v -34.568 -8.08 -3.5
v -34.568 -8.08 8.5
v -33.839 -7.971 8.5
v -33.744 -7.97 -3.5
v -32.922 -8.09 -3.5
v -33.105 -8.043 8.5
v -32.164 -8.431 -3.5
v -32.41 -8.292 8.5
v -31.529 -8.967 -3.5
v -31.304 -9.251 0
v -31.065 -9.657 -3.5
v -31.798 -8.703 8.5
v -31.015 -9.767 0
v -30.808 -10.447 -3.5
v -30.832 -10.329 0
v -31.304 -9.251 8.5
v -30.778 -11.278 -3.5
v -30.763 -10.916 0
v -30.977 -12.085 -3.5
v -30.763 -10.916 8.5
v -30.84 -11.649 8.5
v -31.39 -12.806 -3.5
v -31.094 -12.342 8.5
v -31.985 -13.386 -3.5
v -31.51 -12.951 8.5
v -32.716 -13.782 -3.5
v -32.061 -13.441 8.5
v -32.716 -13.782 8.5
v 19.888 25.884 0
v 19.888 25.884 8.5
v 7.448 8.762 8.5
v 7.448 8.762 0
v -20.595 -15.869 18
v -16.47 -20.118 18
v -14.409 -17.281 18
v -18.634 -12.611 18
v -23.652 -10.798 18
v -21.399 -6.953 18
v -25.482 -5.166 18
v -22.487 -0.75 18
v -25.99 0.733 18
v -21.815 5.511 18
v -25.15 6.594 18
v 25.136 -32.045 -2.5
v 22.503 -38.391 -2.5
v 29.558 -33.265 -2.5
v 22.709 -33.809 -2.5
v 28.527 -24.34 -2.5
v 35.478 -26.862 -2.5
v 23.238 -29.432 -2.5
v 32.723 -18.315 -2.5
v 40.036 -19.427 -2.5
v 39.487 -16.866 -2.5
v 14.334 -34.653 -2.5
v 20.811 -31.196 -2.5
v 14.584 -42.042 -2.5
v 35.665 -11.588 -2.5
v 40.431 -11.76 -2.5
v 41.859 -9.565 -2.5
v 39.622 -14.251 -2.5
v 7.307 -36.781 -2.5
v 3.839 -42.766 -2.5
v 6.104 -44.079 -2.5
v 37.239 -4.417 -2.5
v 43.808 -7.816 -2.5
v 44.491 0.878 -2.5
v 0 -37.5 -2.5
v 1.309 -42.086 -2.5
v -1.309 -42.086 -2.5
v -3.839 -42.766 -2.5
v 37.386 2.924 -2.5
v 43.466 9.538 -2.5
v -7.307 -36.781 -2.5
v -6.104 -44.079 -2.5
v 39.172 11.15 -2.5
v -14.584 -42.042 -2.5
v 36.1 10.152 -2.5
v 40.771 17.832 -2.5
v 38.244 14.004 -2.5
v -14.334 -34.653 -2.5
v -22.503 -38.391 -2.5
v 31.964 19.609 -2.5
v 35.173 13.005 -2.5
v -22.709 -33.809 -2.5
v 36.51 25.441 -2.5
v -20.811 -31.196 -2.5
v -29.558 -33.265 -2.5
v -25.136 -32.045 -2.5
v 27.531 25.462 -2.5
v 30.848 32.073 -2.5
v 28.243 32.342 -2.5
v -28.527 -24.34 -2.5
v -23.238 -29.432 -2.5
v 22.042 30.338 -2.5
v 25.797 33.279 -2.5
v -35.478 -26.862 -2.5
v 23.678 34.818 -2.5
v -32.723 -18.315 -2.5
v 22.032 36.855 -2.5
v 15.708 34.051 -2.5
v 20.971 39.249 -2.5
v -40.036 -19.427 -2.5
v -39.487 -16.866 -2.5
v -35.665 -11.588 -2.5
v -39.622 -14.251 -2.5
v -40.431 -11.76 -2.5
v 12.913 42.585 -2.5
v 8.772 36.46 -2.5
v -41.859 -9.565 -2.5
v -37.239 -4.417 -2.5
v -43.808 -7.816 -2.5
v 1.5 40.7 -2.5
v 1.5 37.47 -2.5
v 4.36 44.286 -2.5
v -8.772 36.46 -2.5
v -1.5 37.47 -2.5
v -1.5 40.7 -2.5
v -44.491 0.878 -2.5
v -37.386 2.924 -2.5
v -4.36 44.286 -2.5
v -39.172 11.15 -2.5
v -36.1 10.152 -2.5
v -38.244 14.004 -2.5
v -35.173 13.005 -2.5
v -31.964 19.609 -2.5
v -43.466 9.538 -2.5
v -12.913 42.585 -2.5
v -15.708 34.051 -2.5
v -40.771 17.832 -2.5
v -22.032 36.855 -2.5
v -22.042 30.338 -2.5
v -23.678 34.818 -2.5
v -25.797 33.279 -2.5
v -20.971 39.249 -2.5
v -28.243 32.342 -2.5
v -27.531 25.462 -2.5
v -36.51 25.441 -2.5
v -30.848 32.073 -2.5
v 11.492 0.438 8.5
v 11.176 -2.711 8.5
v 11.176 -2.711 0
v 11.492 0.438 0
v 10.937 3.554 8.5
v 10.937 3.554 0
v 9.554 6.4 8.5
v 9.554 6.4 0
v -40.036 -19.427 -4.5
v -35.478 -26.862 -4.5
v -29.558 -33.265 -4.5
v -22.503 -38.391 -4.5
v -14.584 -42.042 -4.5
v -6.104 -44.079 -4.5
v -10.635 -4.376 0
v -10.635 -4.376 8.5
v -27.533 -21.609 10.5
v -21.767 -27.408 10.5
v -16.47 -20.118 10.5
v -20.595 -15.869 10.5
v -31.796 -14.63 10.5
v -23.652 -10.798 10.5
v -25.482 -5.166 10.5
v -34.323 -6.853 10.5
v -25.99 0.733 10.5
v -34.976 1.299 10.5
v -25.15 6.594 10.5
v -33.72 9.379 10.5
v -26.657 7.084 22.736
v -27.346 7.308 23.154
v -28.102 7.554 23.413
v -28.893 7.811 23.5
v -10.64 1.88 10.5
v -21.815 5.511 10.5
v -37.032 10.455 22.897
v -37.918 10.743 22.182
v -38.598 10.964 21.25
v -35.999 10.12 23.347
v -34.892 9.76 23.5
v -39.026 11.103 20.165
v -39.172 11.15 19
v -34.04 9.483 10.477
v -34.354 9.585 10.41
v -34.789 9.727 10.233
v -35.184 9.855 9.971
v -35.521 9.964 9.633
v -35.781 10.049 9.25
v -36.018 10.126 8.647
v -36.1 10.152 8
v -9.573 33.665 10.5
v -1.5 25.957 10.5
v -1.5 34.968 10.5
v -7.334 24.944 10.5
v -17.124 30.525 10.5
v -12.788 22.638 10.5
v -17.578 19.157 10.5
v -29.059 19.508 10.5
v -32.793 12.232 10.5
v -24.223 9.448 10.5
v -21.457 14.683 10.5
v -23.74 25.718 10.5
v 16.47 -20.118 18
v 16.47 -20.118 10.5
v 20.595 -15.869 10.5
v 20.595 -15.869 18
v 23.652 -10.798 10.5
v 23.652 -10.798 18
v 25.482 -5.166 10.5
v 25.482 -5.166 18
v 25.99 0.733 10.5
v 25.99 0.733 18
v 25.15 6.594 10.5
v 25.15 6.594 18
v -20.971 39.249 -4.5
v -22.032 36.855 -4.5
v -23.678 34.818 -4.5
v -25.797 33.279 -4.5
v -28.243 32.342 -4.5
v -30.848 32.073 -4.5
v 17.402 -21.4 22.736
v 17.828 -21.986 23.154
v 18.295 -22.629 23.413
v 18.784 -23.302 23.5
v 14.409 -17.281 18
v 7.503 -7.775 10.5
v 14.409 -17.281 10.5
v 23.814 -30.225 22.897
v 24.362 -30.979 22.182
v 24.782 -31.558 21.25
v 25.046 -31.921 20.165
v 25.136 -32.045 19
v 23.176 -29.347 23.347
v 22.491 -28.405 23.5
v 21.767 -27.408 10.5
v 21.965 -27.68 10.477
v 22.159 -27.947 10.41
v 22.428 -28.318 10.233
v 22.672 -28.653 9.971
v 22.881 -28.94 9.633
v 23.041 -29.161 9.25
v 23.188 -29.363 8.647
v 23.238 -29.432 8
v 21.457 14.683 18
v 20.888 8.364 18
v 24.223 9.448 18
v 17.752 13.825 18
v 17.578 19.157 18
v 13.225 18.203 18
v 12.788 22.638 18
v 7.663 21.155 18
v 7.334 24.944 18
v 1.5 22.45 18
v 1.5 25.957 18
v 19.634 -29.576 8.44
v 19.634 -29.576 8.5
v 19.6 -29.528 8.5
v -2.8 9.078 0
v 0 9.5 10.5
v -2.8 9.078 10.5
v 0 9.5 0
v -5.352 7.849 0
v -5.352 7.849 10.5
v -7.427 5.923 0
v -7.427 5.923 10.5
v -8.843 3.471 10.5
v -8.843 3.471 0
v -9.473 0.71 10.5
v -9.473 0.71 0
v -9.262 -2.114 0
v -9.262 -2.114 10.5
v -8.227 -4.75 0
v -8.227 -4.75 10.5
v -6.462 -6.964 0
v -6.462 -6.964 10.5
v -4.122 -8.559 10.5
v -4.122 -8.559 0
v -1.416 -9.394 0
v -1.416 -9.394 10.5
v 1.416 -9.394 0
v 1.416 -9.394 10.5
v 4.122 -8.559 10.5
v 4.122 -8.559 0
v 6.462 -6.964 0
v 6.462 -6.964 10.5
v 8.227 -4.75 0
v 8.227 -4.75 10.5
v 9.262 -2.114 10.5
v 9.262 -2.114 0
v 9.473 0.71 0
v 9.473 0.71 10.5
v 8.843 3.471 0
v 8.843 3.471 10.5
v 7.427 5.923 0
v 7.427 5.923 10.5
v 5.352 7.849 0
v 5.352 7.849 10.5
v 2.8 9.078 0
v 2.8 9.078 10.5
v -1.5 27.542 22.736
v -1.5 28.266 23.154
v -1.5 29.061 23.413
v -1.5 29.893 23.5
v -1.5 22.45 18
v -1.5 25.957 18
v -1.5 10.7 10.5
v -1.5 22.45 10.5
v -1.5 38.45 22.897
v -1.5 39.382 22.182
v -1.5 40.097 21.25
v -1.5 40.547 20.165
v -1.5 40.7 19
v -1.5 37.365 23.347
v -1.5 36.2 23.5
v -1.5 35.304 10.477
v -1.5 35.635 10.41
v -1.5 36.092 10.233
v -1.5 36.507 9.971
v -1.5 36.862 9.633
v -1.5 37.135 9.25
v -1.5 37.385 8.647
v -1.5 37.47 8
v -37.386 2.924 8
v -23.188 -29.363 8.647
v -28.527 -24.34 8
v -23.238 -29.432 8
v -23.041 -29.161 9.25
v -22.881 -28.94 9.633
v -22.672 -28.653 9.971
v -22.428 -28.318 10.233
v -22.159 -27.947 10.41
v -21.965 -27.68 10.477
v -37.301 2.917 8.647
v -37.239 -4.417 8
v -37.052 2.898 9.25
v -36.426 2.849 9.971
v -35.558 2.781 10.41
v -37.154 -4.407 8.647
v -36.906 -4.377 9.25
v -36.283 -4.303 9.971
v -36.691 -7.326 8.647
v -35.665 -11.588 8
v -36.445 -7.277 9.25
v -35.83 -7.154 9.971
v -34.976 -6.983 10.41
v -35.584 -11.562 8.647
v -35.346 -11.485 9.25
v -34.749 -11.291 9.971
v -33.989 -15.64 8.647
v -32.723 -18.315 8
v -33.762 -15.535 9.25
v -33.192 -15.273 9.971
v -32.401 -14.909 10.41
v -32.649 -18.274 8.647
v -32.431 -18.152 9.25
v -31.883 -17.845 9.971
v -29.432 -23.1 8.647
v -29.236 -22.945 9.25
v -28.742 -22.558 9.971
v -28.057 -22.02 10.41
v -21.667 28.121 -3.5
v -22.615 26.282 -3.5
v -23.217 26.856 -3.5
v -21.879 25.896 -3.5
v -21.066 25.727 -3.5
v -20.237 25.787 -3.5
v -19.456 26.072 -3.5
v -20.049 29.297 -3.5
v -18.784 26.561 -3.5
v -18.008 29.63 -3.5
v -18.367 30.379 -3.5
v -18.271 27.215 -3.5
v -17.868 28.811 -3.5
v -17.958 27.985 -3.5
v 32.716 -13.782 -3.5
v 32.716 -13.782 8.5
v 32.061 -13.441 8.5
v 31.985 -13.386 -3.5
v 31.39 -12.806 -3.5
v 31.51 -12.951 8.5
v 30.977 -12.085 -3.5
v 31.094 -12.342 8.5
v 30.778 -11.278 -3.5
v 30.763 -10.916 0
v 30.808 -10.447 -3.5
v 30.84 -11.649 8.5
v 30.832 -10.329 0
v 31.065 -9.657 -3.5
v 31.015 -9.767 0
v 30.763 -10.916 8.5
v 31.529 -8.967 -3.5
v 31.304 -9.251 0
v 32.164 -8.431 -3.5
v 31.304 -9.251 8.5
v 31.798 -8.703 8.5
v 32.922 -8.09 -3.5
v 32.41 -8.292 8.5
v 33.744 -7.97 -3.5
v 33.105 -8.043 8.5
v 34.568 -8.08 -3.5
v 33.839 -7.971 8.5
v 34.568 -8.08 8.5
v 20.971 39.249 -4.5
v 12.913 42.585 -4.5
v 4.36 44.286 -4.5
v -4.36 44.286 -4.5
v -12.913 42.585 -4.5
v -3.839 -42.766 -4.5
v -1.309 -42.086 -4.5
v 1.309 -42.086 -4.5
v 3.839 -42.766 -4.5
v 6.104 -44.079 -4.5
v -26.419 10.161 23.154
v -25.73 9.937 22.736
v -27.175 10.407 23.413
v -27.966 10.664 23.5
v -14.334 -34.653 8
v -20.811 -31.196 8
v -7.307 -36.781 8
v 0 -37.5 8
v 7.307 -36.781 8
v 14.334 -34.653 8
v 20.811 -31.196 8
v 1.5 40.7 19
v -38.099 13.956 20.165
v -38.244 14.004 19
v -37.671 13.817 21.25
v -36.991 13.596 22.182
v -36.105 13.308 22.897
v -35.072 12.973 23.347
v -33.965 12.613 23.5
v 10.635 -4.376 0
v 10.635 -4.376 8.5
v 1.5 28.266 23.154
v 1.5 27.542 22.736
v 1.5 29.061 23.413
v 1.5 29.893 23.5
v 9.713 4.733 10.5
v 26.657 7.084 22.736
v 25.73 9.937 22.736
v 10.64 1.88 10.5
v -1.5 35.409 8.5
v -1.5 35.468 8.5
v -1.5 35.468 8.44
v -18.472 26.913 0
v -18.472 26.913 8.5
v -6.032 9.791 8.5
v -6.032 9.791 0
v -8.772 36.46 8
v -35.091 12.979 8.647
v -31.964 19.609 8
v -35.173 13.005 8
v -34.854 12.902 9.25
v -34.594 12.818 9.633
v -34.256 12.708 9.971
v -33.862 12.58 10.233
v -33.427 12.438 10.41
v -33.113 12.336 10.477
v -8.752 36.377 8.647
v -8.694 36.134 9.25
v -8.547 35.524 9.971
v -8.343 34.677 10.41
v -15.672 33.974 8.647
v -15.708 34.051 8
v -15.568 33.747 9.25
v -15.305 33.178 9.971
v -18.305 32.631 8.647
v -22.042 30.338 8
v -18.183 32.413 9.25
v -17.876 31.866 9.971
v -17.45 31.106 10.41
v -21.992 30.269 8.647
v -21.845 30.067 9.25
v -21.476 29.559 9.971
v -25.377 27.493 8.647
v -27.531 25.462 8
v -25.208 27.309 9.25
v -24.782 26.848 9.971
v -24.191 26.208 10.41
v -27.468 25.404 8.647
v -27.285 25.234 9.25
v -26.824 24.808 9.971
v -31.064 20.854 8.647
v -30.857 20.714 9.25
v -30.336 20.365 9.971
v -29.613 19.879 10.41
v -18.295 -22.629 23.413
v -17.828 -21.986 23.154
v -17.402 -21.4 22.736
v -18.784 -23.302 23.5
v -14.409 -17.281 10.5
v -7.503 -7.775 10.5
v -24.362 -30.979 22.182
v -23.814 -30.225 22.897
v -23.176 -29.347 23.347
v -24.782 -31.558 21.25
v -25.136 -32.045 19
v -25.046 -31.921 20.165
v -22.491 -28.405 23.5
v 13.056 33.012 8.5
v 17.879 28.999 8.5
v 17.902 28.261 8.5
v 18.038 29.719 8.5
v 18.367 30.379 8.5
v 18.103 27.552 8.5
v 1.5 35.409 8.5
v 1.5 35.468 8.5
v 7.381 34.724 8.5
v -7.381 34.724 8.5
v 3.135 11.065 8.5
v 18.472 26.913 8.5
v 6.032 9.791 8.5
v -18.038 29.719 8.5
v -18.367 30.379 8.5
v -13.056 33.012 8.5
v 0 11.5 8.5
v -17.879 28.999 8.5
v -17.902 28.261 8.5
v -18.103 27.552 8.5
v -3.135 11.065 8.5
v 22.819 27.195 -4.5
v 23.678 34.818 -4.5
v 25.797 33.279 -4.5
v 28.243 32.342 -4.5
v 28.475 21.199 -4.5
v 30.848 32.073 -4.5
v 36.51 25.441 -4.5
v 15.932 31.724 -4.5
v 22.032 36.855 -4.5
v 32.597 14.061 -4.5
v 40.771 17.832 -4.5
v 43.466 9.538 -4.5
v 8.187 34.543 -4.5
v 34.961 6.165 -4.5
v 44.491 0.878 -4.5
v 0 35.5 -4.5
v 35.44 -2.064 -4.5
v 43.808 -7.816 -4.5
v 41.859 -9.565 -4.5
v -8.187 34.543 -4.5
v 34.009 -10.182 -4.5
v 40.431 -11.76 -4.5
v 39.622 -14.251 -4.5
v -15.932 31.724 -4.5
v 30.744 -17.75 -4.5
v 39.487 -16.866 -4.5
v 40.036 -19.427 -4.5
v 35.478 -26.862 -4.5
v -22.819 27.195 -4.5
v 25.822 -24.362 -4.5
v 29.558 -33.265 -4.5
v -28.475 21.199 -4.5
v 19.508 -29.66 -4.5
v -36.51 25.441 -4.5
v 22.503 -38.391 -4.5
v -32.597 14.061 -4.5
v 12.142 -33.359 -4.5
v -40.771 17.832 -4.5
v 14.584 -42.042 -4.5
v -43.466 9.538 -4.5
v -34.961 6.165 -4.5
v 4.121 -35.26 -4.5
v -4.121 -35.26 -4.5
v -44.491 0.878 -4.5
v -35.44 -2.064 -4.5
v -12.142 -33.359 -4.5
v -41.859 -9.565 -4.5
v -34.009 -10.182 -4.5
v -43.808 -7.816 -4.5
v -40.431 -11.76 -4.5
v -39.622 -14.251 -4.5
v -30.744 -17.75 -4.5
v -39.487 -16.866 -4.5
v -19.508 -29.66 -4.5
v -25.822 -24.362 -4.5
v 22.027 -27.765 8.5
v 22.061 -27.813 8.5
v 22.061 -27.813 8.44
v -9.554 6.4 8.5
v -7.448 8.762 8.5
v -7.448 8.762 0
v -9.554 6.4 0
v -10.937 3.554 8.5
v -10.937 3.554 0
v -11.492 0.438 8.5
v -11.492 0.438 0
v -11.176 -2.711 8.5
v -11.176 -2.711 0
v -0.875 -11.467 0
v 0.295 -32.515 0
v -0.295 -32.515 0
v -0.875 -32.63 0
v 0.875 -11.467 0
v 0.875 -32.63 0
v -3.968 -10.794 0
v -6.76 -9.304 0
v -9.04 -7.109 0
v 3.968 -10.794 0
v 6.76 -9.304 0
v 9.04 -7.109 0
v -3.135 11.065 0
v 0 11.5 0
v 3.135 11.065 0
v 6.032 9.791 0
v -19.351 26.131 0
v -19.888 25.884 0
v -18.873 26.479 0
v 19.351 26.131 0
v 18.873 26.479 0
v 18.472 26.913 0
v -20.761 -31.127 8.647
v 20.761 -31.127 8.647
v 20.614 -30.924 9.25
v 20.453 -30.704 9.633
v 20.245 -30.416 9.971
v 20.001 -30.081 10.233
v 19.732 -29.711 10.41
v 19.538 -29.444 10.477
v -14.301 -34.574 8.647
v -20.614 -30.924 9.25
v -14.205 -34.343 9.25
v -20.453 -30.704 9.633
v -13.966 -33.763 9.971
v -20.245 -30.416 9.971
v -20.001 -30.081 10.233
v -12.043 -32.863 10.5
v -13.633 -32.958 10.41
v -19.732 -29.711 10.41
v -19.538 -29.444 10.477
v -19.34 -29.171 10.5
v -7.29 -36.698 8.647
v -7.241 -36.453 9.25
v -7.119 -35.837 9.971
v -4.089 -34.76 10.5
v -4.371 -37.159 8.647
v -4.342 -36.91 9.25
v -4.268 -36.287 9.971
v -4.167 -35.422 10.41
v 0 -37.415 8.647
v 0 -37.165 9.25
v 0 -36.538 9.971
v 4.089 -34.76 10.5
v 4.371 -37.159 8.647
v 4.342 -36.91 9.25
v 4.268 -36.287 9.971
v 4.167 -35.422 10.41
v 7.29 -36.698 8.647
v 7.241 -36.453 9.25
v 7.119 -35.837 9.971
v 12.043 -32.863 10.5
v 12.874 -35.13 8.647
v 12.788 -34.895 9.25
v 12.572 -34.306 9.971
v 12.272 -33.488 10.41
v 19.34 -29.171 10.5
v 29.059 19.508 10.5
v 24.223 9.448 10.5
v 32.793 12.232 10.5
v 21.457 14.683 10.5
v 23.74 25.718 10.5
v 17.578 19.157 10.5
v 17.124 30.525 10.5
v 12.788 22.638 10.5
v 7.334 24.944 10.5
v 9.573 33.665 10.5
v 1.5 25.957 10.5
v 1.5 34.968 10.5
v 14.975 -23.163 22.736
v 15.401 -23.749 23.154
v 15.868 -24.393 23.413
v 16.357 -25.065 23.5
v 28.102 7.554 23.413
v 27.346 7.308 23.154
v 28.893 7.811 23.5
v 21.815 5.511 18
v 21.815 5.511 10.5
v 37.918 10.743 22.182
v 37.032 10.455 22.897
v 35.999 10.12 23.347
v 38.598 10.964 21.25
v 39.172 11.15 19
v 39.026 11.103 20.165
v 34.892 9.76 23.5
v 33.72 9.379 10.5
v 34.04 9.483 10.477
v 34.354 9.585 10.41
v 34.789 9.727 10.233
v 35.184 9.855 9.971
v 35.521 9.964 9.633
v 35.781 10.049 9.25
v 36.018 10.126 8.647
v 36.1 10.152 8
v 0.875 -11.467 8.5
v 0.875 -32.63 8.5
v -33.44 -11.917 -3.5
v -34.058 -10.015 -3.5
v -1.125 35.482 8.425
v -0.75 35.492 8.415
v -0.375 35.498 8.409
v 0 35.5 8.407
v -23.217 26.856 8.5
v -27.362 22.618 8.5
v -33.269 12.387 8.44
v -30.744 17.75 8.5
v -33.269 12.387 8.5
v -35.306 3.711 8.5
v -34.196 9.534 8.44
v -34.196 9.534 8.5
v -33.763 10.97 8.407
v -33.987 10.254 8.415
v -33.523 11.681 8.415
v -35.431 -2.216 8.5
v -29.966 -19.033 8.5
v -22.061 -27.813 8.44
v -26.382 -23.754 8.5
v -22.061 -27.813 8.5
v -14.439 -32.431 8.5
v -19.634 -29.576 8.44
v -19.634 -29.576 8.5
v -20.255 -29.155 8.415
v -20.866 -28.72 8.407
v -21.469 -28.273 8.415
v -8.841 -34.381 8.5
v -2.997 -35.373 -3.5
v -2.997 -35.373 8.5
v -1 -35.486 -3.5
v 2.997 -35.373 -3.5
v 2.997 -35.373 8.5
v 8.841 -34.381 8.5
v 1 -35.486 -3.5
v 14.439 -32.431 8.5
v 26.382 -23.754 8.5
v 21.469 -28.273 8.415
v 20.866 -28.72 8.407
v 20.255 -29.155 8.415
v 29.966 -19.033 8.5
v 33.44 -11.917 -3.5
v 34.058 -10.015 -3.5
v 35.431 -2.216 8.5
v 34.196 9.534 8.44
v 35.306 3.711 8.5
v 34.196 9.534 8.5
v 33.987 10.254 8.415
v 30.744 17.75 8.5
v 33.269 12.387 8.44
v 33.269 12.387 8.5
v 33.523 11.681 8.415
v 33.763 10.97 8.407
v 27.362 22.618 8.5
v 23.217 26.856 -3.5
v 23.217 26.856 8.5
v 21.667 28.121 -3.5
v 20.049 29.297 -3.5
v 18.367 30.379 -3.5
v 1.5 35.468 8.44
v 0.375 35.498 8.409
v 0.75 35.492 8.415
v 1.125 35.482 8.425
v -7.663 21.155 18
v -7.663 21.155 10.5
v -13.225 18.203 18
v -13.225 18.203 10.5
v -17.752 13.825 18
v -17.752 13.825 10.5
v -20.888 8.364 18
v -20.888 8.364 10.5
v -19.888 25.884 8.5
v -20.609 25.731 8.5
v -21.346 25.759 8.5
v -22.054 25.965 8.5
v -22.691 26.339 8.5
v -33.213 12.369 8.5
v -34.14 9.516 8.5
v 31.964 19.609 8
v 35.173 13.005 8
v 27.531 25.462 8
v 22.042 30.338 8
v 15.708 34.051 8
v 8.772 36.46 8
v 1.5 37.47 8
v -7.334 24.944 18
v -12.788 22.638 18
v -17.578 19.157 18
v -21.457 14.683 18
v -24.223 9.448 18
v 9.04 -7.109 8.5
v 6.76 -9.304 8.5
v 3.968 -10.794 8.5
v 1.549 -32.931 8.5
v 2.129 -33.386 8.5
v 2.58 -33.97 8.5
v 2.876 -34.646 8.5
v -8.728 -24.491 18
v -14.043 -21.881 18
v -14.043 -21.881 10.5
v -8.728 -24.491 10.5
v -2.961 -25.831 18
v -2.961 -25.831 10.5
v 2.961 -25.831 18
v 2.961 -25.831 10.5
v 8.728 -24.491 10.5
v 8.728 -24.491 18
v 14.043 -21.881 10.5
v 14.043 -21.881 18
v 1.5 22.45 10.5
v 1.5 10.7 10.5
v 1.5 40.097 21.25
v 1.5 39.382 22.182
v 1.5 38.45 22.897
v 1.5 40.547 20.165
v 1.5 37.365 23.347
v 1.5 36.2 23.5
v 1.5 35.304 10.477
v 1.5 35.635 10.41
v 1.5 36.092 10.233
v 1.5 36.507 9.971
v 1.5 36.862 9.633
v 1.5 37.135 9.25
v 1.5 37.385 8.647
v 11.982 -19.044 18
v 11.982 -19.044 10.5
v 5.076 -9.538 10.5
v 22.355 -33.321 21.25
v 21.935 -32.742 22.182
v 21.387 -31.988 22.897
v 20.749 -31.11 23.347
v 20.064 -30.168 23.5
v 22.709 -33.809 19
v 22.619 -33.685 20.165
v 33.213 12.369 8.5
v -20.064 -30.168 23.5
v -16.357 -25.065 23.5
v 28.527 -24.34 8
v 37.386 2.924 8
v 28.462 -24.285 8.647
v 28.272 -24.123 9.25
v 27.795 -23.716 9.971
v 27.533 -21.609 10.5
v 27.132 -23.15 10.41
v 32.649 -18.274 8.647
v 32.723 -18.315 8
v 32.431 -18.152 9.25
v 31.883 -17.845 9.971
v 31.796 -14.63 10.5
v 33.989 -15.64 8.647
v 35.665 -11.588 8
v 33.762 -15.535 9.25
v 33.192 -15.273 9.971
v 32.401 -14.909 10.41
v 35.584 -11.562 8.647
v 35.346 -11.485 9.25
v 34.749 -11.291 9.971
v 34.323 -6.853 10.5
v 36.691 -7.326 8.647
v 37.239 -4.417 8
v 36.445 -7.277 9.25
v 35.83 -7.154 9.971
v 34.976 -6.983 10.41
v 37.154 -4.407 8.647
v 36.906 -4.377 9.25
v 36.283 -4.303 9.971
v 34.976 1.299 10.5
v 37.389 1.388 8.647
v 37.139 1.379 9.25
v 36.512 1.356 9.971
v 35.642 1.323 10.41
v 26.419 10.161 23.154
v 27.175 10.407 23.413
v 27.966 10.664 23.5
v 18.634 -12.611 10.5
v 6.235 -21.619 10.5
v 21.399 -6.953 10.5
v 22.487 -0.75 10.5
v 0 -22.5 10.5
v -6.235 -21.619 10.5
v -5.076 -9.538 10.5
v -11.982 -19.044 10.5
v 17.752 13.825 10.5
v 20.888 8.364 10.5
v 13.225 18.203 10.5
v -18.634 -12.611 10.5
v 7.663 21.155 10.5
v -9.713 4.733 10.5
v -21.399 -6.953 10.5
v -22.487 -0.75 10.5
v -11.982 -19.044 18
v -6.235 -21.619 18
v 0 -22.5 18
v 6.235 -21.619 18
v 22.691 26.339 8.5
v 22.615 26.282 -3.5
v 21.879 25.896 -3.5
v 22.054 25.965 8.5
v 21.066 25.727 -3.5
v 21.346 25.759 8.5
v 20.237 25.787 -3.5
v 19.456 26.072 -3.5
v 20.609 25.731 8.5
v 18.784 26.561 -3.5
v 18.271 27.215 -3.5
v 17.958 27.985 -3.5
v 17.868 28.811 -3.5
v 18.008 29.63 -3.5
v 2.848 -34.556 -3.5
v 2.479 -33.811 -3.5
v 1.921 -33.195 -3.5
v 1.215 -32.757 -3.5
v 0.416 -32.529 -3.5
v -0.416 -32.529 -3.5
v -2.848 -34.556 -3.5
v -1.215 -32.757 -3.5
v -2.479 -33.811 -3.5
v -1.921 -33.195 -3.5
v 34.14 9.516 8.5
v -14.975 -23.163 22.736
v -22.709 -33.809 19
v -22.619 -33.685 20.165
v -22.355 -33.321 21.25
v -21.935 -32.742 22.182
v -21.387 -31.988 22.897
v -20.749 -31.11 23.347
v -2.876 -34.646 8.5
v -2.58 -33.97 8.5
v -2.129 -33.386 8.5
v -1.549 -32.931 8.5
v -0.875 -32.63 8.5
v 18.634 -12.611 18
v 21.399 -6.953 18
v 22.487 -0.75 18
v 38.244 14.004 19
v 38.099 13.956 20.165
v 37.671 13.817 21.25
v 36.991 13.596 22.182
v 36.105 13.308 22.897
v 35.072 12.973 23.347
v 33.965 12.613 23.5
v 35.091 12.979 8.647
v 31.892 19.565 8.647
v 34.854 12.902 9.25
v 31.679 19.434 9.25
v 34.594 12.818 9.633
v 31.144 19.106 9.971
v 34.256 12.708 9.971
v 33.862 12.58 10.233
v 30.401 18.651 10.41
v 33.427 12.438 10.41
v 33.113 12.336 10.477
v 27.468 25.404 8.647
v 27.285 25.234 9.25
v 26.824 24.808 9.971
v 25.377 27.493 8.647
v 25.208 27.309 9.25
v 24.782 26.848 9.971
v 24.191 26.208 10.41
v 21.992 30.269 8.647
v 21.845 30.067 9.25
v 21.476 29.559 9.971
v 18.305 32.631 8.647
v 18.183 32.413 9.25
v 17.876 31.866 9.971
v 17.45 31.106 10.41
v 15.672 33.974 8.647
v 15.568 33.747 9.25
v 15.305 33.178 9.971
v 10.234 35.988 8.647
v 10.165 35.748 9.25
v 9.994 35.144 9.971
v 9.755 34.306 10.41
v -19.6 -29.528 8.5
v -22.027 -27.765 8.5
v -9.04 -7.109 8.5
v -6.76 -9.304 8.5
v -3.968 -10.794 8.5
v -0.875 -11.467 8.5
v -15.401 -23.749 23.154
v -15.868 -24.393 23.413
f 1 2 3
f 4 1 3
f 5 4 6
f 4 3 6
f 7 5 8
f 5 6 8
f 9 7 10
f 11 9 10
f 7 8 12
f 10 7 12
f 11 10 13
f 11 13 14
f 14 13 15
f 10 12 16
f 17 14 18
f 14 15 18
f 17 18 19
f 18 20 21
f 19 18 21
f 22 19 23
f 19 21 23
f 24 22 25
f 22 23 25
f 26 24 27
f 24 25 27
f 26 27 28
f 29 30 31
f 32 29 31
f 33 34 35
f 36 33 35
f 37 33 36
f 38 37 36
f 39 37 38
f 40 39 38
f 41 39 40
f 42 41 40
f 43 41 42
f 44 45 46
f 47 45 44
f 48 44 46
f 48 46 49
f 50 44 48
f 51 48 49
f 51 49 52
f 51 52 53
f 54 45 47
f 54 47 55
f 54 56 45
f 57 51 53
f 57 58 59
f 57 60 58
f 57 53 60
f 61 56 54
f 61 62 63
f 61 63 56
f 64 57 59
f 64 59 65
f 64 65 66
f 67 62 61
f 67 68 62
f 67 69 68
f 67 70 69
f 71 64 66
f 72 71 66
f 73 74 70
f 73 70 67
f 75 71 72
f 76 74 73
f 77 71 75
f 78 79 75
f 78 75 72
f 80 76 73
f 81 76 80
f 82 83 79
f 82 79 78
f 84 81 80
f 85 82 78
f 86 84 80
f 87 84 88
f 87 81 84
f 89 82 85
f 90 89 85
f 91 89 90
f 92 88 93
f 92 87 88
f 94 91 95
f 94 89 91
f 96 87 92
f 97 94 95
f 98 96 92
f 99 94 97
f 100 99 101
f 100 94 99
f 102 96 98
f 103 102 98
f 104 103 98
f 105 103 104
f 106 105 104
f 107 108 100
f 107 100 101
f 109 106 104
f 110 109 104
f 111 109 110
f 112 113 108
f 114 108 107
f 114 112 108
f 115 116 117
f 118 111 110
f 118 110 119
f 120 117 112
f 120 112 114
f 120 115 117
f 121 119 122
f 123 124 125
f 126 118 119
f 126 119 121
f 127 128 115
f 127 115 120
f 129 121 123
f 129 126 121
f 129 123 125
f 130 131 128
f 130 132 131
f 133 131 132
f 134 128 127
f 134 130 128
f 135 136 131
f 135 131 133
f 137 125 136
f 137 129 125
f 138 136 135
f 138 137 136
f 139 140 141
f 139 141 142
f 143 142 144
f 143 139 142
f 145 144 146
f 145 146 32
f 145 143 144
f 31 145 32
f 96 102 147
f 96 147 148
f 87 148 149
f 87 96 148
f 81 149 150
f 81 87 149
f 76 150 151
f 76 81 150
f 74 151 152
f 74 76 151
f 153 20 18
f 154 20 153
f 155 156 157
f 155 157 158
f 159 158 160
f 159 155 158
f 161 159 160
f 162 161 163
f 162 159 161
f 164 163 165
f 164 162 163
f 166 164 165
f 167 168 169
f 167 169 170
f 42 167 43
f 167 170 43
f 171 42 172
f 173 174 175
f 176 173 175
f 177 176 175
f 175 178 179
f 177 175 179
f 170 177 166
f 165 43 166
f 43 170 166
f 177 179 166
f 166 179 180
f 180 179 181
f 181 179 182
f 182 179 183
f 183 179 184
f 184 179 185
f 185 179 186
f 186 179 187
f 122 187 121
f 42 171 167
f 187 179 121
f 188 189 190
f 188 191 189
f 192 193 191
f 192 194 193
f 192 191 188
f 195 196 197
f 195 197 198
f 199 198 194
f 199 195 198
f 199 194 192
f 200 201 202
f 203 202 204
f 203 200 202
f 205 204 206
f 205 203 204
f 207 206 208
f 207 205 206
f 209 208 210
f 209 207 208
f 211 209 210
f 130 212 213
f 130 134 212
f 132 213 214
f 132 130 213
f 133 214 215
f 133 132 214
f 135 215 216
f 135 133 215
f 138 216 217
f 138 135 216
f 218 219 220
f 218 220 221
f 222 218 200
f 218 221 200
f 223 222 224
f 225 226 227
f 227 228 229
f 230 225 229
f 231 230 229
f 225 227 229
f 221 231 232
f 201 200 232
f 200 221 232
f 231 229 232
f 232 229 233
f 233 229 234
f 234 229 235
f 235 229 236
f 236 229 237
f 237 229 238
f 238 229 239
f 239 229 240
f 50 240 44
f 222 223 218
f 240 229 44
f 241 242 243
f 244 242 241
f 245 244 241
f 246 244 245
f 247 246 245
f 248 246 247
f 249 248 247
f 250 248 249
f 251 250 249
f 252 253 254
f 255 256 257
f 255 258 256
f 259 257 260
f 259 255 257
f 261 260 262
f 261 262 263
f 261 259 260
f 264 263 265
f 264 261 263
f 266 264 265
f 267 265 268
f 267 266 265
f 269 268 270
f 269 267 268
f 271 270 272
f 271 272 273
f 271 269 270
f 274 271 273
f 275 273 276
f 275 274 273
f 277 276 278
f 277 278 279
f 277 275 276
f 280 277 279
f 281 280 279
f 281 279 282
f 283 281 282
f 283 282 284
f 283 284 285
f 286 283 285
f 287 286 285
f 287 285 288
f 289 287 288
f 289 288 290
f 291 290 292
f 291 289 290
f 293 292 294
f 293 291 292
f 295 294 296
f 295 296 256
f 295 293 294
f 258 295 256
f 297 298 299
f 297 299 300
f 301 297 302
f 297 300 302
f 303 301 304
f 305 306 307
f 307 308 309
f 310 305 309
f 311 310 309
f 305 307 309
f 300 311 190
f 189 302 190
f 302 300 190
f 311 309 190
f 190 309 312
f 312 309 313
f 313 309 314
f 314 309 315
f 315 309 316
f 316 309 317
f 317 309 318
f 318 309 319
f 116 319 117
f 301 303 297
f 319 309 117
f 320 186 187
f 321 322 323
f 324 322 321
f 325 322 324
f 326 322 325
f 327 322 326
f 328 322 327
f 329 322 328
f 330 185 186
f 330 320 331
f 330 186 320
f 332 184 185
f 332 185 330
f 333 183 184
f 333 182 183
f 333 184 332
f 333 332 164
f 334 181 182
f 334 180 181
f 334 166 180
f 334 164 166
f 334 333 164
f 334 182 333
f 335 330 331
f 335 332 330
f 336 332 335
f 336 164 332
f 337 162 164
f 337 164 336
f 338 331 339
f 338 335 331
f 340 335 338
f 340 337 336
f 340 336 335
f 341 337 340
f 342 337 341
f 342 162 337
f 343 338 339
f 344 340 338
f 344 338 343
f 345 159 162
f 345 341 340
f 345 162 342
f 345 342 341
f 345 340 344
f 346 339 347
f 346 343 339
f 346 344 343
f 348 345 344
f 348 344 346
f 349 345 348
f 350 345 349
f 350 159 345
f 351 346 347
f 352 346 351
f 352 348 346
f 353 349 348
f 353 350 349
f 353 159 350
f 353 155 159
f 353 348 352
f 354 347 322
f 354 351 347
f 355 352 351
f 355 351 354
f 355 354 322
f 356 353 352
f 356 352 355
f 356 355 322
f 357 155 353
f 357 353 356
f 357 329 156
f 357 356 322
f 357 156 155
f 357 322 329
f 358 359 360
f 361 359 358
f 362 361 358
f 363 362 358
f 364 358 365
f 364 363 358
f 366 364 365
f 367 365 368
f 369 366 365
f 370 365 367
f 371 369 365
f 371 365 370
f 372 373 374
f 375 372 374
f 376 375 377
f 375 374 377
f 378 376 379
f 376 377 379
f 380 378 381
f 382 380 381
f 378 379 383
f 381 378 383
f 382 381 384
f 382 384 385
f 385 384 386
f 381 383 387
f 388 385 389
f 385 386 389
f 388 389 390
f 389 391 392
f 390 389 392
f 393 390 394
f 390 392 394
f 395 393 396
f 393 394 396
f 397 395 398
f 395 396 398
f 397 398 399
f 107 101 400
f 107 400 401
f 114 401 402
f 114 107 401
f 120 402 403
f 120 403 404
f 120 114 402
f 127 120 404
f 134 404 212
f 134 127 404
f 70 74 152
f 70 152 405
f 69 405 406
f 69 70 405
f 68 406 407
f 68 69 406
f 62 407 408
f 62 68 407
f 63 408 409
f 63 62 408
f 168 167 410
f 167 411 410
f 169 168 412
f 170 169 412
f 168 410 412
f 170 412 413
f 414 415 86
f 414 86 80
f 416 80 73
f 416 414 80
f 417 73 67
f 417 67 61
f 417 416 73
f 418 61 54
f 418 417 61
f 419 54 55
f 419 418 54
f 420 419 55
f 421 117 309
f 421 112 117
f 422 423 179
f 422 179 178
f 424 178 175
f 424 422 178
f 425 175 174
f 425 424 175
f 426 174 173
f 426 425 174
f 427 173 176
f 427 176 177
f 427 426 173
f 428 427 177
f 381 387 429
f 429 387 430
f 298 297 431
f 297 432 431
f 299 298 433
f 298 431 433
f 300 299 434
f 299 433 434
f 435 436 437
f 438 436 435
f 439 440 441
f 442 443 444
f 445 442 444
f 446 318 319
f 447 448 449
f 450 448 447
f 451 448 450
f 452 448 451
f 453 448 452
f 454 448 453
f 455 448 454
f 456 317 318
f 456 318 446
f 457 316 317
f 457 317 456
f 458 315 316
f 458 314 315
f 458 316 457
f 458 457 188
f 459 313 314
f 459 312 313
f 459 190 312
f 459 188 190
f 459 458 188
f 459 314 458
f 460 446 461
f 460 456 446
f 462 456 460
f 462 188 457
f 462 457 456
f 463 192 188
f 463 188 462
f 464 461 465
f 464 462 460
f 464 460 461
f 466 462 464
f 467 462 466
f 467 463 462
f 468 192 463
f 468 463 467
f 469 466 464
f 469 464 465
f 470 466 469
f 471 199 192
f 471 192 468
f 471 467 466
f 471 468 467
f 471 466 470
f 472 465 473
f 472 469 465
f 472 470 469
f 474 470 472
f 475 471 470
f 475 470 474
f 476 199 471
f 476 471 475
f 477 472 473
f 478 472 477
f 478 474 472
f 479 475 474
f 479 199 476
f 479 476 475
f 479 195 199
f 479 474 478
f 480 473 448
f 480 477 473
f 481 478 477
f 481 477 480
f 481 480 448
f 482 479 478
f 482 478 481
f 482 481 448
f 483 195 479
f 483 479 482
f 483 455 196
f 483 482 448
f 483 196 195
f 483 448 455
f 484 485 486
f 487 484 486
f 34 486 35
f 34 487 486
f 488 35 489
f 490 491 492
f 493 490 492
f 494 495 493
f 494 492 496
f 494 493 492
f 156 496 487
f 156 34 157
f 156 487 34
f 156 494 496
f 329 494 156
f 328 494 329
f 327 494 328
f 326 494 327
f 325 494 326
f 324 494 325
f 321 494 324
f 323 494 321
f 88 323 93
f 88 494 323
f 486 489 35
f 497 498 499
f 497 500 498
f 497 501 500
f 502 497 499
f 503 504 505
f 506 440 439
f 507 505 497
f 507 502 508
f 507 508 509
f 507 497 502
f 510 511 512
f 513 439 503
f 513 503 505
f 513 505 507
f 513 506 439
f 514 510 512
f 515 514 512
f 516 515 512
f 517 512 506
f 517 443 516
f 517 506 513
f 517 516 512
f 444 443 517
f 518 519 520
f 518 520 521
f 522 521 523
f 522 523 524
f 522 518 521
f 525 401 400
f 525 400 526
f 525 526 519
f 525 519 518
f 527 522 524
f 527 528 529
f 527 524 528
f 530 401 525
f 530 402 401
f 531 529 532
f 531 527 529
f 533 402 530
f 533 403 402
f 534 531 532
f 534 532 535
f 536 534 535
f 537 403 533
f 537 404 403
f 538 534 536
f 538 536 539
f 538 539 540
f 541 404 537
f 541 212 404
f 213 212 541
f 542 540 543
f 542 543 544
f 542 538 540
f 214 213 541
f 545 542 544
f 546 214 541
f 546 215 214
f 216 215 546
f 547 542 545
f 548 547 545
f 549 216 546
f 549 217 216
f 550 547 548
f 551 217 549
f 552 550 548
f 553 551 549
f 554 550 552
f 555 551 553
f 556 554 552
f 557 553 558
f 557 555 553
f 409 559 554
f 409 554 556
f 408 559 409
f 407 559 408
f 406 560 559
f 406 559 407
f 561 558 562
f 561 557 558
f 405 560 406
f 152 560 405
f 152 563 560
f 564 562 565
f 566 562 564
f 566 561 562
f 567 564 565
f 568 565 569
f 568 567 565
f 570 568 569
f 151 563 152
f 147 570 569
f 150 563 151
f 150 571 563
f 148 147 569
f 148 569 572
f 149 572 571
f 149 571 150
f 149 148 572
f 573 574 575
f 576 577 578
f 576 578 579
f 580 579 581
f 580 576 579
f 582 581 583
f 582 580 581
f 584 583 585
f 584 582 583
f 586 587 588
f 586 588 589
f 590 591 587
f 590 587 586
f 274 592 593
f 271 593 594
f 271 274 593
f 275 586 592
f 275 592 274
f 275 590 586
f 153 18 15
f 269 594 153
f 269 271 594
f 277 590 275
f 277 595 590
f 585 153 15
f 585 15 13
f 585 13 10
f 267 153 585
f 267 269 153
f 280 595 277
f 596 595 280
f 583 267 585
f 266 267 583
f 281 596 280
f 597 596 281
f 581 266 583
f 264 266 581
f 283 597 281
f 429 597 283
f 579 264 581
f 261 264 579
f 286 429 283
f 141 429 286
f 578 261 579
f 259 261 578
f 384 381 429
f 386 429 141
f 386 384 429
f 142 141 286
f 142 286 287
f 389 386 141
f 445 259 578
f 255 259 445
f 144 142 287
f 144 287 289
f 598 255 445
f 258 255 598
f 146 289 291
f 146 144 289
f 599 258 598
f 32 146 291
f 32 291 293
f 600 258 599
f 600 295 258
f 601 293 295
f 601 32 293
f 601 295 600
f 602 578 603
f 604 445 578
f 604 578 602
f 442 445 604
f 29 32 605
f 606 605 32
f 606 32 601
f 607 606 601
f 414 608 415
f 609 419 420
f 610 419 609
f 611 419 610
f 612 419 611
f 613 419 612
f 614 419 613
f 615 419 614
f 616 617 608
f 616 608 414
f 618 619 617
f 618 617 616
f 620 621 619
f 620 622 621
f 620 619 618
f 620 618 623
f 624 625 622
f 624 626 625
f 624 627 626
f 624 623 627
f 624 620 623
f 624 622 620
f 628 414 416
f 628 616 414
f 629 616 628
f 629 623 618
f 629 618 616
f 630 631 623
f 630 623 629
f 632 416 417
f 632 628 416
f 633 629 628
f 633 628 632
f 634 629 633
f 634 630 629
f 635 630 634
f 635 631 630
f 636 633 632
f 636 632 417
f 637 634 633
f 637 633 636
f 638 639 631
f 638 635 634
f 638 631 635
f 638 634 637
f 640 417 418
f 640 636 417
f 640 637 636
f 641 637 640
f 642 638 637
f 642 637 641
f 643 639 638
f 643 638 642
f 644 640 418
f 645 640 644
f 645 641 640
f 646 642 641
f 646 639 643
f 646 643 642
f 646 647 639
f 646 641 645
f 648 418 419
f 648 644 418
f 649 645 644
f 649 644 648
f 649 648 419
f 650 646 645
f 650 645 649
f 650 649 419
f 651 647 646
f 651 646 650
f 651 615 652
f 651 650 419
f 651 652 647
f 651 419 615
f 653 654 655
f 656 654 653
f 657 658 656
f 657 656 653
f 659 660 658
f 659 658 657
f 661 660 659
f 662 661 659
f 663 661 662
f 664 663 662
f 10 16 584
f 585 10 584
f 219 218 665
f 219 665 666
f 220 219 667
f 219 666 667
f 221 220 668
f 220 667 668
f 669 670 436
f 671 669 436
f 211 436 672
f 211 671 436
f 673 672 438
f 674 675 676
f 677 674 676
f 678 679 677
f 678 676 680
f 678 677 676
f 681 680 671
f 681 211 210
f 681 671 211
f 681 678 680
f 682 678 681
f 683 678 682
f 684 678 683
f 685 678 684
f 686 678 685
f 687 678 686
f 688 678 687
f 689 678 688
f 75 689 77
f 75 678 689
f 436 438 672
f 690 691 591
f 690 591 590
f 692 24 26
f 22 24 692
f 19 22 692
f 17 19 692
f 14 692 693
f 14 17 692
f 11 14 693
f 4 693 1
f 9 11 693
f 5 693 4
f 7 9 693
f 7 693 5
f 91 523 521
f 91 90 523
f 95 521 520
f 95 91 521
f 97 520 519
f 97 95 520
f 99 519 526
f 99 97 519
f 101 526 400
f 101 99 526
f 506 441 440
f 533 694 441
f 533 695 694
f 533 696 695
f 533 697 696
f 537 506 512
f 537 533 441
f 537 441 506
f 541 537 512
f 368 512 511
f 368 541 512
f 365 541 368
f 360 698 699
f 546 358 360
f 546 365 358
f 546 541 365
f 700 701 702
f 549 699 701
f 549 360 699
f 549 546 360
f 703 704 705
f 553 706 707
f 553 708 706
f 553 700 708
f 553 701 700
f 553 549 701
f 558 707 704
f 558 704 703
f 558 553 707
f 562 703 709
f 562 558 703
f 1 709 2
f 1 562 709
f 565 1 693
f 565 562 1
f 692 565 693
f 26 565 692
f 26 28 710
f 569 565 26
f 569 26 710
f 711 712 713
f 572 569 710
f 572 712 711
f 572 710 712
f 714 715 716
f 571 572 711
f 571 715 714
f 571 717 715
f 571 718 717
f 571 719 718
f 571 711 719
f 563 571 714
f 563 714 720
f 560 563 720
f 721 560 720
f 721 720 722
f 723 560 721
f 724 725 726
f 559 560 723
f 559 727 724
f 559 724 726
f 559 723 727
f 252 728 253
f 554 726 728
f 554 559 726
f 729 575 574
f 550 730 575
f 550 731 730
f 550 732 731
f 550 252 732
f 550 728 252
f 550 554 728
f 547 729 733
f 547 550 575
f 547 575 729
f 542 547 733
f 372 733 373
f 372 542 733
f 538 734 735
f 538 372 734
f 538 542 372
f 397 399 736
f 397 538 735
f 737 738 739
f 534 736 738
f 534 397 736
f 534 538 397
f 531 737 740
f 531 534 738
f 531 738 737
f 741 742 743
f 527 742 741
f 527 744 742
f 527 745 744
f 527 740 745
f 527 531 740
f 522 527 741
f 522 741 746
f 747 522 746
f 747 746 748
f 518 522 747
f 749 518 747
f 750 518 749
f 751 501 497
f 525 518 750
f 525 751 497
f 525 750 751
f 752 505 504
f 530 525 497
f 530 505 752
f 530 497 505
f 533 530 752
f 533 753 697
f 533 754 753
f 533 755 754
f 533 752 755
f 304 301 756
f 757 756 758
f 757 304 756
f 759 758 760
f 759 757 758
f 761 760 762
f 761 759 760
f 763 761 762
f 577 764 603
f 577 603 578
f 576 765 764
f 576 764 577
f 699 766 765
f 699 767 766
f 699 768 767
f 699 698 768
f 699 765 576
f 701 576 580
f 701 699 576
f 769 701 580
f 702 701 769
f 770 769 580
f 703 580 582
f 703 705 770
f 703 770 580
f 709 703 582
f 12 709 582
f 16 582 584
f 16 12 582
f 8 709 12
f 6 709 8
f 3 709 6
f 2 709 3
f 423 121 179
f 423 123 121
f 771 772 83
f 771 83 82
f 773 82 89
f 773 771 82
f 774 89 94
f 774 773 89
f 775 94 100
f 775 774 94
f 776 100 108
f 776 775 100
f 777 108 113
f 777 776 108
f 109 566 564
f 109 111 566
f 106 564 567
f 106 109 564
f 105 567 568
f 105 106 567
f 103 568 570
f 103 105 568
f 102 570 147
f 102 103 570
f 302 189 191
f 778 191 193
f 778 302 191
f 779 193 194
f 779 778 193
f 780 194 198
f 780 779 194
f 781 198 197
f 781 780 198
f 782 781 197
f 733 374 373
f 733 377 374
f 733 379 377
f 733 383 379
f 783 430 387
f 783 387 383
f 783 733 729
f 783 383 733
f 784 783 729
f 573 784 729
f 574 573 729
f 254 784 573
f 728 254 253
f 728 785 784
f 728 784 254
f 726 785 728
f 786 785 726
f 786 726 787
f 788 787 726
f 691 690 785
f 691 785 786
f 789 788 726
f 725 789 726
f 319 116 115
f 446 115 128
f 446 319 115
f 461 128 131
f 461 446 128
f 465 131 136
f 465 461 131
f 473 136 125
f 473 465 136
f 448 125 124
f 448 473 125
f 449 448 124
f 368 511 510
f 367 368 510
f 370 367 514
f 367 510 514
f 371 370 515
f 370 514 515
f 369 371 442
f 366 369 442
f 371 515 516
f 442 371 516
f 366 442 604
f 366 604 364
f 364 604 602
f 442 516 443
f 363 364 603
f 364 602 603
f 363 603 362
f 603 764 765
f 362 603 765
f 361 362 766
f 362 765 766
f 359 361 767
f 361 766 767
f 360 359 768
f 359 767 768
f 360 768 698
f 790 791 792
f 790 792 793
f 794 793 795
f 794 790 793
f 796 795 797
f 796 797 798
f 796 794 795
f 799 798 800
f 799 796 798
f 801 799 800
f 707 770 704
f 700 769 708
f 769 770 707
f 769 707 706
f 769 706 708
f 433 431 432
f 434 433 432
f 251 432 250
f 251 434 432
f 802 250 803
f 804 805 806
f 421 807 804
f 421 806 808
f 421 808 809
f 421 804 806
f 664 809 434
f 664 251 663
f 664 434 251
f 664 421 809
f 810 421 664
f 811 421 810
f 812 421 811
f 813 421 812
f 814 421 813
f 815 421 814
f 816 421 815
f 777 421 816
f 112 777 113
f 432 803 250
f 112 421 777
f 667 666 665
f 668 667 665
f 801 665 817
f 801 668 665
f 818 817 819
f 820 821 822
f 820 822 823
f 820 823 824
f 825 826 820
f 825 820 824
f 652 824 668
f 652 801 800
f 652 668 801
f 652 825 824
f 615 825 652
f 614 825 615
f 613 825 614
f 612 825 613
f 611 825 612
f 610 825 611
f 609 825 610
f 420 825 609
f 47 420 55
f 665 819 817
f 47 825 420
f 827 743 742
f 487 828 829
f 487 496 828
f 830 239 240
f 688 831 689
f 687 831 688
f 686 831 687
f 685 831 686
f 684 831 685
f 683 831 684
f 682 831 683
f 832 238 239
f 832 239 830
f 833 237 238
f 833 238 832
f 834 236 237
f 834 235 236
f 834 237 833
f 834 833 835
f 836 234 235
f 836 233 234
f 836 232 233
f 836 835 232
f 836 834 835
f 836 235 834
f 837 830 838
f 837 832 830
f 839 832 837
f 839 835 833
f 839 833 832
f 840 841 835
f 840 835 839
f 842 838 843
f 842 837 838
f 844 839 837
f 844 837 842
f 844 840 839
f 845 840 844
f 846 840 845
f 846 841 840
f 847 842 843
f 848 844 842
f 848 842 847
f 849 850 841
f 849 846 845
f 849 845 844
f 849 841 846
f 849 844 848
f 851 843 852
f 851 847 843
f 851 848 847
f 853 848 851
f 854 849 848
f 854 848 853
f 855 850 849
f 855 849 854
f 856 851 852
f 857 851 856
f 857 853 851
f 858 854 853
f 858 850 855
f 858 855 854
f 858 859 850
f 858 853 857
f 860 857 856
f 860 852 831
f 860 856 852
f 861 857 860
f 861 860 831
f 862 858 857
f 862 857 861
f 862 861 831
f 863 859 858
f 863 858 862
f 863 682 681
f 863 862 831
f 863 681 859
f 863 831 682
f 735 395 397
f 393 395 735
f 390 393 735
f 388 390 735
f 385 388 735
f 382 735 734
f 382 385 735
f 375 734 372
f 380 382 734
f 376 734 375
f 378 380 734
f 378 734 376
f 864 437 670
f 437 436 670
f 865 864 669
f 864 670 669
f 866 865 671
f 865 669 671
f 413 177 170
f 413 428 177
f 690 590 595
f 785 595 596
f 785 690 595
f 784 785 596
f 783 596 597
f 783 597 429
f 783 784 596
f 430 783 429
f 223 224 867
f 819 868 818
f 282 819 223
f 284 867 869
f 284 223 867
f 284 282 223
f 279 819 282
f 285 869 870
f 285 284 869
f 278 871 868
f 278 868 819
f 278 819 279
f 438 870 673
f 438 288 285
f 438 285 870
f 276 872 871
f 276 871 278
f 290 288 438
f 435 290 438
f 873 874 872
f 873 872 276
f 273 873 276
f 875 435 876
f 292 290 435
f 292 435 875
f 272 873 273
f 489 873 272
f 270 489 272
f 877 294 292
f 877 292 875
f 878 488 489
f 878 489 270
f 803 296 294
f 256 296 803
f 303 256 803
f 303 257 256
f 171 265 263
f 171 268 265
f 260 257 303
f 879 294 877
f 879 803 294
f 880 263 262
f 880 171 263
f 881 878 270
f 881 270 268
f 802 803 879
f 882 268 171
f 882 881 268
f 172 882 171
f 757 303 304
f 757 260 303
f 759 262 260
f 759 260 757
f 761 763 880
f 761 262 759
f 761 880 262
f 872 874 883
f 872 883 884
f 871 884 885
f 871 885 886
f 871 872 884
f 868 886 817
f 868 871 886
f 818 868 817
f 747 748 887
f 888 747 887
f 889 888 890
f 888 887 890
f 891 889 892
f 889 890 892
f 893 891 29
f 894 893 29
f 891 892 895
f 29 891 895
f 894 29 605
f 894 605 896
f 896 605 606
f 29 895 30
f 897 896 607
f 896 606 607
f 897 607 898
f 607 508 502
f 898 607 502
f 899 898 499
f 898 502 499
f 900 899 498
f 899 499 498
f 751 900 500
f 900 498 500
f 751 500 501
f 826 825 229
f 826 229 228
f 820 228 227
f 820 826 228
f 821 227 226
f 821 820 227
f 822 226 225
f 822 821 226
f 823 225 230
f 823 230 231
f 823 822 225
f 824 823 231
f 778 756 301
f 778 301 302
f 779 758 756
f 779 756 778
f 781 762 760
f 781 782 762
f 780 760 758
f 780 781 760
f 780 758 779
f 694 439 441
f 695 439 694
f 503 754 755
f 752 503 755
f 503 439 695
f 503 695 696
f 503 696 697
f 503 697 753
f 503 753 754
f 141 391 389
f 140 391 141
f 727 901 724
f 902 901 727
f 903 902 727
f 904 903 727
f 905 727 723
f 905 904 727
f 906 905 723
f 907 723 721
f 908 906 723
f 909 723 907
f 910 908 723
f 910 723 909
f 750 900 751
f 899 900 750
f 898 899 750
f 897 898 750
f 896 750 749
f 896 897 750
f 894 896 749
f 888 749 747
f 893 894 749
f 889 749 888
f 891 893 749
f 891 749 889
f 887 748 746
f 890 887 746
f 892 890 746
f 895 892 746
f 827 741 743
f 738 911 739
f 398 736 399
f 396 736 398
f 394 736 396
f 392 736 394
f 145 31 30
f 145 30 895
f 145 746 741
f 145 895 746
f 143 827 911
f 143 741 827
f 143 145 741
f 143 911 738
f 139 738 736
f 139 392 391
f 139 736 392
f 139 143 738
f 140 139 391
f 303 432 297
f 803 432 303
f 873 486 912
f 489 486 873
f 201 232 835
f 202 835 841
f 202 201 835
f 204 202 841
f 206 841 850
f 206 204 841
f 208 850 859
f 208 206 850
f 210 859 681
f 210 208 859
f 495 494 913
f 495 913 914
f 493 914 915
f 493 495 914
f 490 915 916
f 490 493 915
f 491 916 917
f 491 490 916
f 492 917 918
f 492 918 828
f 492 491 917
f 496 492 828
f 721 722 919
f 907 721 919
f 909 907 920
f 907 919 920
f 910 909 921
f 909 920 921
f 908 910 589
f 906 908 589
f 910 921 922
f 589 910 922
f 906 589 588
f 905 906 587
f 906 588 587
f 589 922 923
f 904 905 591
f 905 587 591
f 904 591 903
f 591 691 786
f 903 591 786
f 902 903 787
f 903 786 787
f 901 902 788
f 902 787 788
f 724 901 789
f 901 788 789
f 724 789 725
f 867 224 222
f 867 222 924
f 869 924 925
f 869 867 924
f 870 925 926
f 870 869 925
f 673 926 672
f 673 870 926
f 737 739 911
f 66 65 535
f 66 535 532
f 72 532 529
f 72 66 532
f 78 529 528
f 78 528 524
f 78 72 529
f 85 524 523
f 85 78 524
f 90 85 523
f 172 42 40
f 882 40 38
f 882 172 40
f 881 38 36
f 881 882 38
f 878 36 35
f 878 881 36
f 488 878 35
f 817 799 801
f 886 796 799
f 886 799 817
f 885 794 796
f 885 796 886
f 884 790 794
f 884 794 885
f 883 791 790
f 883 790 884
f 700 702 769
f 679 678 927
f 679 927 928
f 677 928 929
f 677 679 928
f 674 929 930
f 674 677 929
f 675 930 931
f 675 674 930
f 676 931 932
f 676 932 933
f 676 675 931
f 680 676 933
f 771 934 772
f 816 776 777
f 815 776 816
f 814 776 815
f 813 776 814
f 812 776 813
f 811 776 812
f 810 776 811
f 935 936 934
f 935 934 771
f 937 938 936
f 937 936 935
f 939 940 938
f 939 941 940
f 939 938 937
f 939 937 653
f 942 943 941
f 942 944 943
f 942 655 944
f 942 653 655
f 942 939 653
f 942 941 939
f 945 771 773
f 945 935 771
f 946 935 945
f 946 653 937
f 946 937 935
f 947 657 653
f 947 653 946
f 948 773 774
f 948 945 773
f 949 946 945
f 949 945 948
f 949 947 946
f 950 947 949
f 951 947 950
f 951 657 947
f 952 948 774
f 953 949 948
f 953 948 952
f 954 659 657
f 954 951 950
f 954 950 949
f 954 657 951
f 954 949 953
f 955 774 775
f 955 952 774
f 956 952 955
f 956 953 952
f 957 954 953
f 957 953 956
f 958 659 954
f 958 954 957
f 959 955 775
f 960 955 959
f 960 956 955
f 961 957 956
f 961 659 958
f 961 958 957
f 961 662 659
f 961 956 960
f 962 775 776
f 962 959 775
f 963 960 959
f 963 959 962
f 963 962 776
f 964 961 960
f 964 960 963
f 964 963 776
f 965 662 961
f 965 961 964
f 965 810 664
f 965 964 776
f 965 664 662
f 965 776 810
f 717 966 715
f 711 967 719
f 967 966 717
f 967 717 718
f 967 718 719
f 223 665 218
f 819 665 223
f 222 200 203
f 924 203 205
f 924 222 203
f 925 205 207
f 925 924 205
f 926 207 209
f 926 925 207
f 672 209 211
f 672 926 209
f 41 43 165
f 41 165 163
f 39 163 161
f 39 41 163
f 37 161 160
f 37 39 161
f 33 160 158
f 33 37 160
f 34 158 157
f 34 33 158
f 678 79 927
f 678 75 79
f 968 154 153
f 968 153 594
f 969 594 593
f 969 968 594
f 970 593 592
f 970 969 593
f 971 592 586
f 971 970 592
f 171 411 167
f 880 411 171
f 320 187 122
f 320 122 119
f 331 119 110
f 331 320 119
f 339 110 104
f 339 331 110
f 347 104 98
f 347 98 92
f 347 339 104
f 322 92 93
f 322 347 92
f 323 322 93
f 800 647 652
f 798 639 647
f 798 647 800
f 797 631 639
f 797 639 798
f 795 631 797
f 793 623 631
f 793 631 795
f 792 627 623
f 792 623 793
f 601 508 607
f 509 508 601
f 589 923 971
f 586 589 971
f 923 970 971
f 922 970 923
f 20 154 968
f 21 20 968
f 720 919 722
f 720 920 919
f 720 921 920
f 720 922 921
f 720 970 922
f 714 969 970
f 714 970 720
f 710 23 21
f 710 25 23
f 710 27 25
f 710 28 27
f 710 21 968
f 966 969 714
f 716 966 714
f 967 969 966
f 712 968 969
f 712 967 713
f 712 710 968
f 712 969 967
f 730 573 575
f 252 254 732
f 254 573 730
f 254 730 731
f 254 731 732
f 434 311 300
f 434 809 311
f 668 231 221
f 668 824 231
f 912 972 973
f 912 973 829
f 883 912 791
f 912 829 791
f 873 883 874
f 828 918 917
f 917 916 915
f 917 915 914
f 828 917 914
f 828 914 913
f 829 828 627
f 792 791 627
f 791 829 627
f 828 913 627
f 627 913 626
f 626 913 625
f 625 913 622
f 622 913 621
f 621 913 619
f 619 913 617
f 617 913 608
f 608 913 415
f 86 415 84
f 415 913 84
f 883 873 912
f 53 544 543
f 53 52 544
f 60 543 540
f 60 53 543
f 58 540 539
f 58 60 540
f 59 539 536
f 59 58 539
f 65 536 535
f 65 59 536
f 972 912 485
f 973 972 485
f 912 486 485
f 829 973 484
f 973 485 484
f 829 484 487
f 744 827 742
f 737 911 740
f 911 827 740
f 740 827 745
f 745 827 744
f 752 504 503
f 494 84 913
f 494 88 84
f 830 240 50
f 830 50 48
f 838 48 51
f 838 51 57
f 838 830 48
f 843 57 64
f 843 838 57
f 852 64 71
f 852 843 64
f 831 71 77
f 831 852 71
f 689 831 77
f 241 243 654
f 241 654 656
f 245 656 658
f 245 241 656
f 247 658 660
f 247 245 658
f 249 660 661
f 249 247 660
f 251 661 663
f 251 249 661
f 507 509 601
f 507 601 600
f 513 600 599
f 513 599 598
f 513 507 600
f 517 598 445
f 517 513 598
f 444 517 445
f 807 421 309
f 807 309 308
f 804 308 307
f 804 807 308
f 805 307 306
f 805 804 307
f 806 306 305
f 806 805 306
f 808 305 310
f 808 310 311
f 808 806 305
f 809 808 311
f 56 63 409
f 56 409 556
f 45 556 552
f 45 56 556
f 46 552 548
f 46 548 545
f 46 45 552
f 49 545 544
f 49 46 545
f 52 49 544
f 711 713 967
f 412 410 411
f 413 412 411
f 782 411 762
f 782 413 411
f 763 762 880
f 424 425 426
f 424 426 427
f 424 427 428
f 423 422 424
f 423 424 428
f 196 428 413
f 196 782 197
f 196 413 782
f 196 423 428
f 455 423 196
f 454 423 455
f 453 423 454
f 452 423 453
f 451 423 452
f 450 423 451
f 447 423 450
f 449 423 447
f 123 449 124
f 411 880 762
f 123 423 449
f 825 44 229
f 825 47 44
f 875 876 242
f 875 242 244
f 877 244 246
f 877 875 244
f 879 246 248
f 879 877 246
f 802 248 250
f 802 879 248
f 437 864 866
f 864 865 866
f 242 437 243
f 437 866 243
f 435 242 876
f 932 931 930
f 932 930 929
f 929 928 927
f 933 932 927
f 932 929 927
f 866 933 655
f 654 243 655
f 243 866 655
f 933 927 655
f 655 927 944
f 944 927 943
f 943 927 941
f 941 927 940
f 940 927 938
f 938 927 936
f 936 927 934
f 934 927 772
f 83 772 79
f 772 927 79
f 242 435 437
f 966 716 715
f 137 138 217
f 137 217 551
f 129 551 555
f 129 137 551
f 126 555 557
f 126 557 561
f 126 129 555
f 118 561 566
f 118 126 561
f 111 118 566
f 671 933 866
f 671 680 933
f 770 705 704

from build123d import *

# Parameters (mm, degrees)
FILLET1_R                = 2.5
BOSS_EXTRUDE1_DEPTH      = 1.5
FILLET2_R                = 4
CIRPATTERN1_COUNT        = 5
FILLET2_OF_CIRPATTERN1_R = 4
CUT_EXTRUDE1_START       = -29.0000001
SKETCH4_R                = 10
CUT_EXTRUDE1_DEPTH       = 30.0000001
BOSS_EXTRUDE2_DEPTH      = 12
SKETCH6_W                = 1.75
SKETCH6_H                = 24
BOSS_EXTRUDE3_DEPTH      = 8.5
CIRPATTERN2_COUNT        = 5


with BuildPart() as part:
    # Sketch2 → Revolve1 (revolve)
    with BuildSketch(Plane(origin=(0, 0, 0), x_dir=(0, 0, -1), z_dir=(1, 0, 0))):
        Polygon((2.5, 44.5), (2.5, 37.5), (-10.5, 37.5), (-10.5, 26), (-18, 26), (-18, 22.5), (-10.5, 22.5), (-10.5, 9.5), (0, 9.5), (0, 11.5), (-8.5, 11.5), (-8.5, 35.5), (4.5, 35.5), (4.5, 44.5), align=None)
    revolve(axis=Axis((0, 0, -45.438153482), (0, 0, 1)))

    # Fillet1
    fillet1_edges = [part.edges().sort_by_distance(p)[0] for p in [
        (0, -37.5, 10.5),
    ]]
    fillet(fillet1_edges, radius=FILLET1_R)

    # Sketch3 → Boss-Extrude1 (add, symmetric)
    with BuildSketch(Plane(origin=(0, 0, 0), x_dir=(0, 0, -1), z_dir=(1, 0, 0))):
        with BuildLine():
            Line((2.5, 40.7), (-19, 40.7))
            ThreePointArc((-19, 40.7), (-22.181980515, 39.381980515), (-23.5, 36.2))
            Line((-23.5, 36.2), (-23.5, 28.592964966))
            Line((-23.5, 28.592964966), (-10.5, 10.7))
            Line((-10.5, 10.7), (-10.5, 33.460767767))
            Line((-10.5, 33.460767767), (-6.918763004, 36.95))
            Line((-6.918763004, 36.95), (2.5, 36.95))
            Line((2.5, 36.95), (2.5, 40.7))
        make_face()
    boss_extrude1 = extrude(amount=BOSS_EXTRUDE1_DEPTH, both=True)

    # Fillet2
    fillet2_edges = [part.edges().sort_by_distance(p)[0] for p in [
        (0, 28.592964966, 23.5),
    ]]
    fillet(fillet2_edges, radius=FILLET2_R)

    # CirPattern1: Boss-Extrude1 ×5 about axis
    cirpattern1_axis = Axis((0, 0, 0), (0, 0, 1))
    for i in range(1, CIRPATTERN1_COUNT):
        add(boss_extrude1.rotate(cirpattern1_axis, i * 360 / CIRPATTERN1_COUNT))

    # Fillet2 of CirPattern1
    fillet2_of_cirpattern1_edges = [part.edges().sort_by_distance(p)[0] for p in [
        (-27.193525651, 8.835712094, 23.5),
        (-16.806523126, -23.132194577, 23.5),
        (16.806523126, -23.132194577, 23.5),
        (27.193525651, 8.835712094, 23.5),
    ]]
    fillet(fillet2_of_cirpattern1_edges, radius=FILLET2_OF_CIRPATTERN1_R)

    # Sketch4 → Cut-Extrude1 (cut)
    with BuildSketch(Plane(origin=(0, 0, -4.5), x_dir=(-1, 0, 0), z_dir=(0, 0, -1)).offset(CUT_EXTRUDE1_START)):
        with Locations((0, -52)):
            Circle(SKETCH4_R)
    cut_extrude1 = extrude(amount=CUT_EXTRUDE1_DEPTH, mode=Mode.SUBTRACT)

    # Sketch5 → Boss-Extrude2 (add)
    with BuildSketch(Plane(origin=(0, 0, 8.5), x_dir=(-1, 0, 0), z_dir=(0, 0, -1))):
        with BuildLine():
            Line((-2.997320764, -35.373239437), (0, -37.103743386))
            Line((0, -37.103743386), (2.997320764, -35.373239437))
            ThreePointArc((2.997320764, -35.373239437), (0, -32.5), (-2.997320764, -35.373239437))
        make_face()
    boss_extrude2 = extrude(amount=BOSS_EXTRUDE2_DEPTH)

    # Sketch6 → Boss-Extrude3 (add)
    with BuildSketch(Plane(origin=(0, 0, 8.5), x_dir=(-1, 0, 0), z_dir=(0, 0, -1))):
        with Locations((0, -22.75)):
            Rectangle(SKETCH6_W, SKETCH6_H)
    boss_extrude3 = extrude(amount=BOSS_EXTRUDE3_DEPTH)

    # CirPattern2: Cut-Extrude1, Boss-Extrude2, Boss-Extrude3 ×5 about axis
    cirpattern2_axis = Axis((0, 0, 0), (0, 0, 1))
    for i in range(1, CIRPATTERN2_COUNT):
        add(cut_extrude1.rotate(cirpattern2_axis, i * 360 / CIRPATTERN2_COUNT), mode=Mode.SUBTRACT)
        add(boss_extrude2.rotate(cirpattern2_axis, i * 360 / CIRPATTERN2_COUNT))
        add(boss_extrude3.rotate(cirpattern2_axis, i * 360 / CIRPATTERN2_COUNT))


solid = part.part
